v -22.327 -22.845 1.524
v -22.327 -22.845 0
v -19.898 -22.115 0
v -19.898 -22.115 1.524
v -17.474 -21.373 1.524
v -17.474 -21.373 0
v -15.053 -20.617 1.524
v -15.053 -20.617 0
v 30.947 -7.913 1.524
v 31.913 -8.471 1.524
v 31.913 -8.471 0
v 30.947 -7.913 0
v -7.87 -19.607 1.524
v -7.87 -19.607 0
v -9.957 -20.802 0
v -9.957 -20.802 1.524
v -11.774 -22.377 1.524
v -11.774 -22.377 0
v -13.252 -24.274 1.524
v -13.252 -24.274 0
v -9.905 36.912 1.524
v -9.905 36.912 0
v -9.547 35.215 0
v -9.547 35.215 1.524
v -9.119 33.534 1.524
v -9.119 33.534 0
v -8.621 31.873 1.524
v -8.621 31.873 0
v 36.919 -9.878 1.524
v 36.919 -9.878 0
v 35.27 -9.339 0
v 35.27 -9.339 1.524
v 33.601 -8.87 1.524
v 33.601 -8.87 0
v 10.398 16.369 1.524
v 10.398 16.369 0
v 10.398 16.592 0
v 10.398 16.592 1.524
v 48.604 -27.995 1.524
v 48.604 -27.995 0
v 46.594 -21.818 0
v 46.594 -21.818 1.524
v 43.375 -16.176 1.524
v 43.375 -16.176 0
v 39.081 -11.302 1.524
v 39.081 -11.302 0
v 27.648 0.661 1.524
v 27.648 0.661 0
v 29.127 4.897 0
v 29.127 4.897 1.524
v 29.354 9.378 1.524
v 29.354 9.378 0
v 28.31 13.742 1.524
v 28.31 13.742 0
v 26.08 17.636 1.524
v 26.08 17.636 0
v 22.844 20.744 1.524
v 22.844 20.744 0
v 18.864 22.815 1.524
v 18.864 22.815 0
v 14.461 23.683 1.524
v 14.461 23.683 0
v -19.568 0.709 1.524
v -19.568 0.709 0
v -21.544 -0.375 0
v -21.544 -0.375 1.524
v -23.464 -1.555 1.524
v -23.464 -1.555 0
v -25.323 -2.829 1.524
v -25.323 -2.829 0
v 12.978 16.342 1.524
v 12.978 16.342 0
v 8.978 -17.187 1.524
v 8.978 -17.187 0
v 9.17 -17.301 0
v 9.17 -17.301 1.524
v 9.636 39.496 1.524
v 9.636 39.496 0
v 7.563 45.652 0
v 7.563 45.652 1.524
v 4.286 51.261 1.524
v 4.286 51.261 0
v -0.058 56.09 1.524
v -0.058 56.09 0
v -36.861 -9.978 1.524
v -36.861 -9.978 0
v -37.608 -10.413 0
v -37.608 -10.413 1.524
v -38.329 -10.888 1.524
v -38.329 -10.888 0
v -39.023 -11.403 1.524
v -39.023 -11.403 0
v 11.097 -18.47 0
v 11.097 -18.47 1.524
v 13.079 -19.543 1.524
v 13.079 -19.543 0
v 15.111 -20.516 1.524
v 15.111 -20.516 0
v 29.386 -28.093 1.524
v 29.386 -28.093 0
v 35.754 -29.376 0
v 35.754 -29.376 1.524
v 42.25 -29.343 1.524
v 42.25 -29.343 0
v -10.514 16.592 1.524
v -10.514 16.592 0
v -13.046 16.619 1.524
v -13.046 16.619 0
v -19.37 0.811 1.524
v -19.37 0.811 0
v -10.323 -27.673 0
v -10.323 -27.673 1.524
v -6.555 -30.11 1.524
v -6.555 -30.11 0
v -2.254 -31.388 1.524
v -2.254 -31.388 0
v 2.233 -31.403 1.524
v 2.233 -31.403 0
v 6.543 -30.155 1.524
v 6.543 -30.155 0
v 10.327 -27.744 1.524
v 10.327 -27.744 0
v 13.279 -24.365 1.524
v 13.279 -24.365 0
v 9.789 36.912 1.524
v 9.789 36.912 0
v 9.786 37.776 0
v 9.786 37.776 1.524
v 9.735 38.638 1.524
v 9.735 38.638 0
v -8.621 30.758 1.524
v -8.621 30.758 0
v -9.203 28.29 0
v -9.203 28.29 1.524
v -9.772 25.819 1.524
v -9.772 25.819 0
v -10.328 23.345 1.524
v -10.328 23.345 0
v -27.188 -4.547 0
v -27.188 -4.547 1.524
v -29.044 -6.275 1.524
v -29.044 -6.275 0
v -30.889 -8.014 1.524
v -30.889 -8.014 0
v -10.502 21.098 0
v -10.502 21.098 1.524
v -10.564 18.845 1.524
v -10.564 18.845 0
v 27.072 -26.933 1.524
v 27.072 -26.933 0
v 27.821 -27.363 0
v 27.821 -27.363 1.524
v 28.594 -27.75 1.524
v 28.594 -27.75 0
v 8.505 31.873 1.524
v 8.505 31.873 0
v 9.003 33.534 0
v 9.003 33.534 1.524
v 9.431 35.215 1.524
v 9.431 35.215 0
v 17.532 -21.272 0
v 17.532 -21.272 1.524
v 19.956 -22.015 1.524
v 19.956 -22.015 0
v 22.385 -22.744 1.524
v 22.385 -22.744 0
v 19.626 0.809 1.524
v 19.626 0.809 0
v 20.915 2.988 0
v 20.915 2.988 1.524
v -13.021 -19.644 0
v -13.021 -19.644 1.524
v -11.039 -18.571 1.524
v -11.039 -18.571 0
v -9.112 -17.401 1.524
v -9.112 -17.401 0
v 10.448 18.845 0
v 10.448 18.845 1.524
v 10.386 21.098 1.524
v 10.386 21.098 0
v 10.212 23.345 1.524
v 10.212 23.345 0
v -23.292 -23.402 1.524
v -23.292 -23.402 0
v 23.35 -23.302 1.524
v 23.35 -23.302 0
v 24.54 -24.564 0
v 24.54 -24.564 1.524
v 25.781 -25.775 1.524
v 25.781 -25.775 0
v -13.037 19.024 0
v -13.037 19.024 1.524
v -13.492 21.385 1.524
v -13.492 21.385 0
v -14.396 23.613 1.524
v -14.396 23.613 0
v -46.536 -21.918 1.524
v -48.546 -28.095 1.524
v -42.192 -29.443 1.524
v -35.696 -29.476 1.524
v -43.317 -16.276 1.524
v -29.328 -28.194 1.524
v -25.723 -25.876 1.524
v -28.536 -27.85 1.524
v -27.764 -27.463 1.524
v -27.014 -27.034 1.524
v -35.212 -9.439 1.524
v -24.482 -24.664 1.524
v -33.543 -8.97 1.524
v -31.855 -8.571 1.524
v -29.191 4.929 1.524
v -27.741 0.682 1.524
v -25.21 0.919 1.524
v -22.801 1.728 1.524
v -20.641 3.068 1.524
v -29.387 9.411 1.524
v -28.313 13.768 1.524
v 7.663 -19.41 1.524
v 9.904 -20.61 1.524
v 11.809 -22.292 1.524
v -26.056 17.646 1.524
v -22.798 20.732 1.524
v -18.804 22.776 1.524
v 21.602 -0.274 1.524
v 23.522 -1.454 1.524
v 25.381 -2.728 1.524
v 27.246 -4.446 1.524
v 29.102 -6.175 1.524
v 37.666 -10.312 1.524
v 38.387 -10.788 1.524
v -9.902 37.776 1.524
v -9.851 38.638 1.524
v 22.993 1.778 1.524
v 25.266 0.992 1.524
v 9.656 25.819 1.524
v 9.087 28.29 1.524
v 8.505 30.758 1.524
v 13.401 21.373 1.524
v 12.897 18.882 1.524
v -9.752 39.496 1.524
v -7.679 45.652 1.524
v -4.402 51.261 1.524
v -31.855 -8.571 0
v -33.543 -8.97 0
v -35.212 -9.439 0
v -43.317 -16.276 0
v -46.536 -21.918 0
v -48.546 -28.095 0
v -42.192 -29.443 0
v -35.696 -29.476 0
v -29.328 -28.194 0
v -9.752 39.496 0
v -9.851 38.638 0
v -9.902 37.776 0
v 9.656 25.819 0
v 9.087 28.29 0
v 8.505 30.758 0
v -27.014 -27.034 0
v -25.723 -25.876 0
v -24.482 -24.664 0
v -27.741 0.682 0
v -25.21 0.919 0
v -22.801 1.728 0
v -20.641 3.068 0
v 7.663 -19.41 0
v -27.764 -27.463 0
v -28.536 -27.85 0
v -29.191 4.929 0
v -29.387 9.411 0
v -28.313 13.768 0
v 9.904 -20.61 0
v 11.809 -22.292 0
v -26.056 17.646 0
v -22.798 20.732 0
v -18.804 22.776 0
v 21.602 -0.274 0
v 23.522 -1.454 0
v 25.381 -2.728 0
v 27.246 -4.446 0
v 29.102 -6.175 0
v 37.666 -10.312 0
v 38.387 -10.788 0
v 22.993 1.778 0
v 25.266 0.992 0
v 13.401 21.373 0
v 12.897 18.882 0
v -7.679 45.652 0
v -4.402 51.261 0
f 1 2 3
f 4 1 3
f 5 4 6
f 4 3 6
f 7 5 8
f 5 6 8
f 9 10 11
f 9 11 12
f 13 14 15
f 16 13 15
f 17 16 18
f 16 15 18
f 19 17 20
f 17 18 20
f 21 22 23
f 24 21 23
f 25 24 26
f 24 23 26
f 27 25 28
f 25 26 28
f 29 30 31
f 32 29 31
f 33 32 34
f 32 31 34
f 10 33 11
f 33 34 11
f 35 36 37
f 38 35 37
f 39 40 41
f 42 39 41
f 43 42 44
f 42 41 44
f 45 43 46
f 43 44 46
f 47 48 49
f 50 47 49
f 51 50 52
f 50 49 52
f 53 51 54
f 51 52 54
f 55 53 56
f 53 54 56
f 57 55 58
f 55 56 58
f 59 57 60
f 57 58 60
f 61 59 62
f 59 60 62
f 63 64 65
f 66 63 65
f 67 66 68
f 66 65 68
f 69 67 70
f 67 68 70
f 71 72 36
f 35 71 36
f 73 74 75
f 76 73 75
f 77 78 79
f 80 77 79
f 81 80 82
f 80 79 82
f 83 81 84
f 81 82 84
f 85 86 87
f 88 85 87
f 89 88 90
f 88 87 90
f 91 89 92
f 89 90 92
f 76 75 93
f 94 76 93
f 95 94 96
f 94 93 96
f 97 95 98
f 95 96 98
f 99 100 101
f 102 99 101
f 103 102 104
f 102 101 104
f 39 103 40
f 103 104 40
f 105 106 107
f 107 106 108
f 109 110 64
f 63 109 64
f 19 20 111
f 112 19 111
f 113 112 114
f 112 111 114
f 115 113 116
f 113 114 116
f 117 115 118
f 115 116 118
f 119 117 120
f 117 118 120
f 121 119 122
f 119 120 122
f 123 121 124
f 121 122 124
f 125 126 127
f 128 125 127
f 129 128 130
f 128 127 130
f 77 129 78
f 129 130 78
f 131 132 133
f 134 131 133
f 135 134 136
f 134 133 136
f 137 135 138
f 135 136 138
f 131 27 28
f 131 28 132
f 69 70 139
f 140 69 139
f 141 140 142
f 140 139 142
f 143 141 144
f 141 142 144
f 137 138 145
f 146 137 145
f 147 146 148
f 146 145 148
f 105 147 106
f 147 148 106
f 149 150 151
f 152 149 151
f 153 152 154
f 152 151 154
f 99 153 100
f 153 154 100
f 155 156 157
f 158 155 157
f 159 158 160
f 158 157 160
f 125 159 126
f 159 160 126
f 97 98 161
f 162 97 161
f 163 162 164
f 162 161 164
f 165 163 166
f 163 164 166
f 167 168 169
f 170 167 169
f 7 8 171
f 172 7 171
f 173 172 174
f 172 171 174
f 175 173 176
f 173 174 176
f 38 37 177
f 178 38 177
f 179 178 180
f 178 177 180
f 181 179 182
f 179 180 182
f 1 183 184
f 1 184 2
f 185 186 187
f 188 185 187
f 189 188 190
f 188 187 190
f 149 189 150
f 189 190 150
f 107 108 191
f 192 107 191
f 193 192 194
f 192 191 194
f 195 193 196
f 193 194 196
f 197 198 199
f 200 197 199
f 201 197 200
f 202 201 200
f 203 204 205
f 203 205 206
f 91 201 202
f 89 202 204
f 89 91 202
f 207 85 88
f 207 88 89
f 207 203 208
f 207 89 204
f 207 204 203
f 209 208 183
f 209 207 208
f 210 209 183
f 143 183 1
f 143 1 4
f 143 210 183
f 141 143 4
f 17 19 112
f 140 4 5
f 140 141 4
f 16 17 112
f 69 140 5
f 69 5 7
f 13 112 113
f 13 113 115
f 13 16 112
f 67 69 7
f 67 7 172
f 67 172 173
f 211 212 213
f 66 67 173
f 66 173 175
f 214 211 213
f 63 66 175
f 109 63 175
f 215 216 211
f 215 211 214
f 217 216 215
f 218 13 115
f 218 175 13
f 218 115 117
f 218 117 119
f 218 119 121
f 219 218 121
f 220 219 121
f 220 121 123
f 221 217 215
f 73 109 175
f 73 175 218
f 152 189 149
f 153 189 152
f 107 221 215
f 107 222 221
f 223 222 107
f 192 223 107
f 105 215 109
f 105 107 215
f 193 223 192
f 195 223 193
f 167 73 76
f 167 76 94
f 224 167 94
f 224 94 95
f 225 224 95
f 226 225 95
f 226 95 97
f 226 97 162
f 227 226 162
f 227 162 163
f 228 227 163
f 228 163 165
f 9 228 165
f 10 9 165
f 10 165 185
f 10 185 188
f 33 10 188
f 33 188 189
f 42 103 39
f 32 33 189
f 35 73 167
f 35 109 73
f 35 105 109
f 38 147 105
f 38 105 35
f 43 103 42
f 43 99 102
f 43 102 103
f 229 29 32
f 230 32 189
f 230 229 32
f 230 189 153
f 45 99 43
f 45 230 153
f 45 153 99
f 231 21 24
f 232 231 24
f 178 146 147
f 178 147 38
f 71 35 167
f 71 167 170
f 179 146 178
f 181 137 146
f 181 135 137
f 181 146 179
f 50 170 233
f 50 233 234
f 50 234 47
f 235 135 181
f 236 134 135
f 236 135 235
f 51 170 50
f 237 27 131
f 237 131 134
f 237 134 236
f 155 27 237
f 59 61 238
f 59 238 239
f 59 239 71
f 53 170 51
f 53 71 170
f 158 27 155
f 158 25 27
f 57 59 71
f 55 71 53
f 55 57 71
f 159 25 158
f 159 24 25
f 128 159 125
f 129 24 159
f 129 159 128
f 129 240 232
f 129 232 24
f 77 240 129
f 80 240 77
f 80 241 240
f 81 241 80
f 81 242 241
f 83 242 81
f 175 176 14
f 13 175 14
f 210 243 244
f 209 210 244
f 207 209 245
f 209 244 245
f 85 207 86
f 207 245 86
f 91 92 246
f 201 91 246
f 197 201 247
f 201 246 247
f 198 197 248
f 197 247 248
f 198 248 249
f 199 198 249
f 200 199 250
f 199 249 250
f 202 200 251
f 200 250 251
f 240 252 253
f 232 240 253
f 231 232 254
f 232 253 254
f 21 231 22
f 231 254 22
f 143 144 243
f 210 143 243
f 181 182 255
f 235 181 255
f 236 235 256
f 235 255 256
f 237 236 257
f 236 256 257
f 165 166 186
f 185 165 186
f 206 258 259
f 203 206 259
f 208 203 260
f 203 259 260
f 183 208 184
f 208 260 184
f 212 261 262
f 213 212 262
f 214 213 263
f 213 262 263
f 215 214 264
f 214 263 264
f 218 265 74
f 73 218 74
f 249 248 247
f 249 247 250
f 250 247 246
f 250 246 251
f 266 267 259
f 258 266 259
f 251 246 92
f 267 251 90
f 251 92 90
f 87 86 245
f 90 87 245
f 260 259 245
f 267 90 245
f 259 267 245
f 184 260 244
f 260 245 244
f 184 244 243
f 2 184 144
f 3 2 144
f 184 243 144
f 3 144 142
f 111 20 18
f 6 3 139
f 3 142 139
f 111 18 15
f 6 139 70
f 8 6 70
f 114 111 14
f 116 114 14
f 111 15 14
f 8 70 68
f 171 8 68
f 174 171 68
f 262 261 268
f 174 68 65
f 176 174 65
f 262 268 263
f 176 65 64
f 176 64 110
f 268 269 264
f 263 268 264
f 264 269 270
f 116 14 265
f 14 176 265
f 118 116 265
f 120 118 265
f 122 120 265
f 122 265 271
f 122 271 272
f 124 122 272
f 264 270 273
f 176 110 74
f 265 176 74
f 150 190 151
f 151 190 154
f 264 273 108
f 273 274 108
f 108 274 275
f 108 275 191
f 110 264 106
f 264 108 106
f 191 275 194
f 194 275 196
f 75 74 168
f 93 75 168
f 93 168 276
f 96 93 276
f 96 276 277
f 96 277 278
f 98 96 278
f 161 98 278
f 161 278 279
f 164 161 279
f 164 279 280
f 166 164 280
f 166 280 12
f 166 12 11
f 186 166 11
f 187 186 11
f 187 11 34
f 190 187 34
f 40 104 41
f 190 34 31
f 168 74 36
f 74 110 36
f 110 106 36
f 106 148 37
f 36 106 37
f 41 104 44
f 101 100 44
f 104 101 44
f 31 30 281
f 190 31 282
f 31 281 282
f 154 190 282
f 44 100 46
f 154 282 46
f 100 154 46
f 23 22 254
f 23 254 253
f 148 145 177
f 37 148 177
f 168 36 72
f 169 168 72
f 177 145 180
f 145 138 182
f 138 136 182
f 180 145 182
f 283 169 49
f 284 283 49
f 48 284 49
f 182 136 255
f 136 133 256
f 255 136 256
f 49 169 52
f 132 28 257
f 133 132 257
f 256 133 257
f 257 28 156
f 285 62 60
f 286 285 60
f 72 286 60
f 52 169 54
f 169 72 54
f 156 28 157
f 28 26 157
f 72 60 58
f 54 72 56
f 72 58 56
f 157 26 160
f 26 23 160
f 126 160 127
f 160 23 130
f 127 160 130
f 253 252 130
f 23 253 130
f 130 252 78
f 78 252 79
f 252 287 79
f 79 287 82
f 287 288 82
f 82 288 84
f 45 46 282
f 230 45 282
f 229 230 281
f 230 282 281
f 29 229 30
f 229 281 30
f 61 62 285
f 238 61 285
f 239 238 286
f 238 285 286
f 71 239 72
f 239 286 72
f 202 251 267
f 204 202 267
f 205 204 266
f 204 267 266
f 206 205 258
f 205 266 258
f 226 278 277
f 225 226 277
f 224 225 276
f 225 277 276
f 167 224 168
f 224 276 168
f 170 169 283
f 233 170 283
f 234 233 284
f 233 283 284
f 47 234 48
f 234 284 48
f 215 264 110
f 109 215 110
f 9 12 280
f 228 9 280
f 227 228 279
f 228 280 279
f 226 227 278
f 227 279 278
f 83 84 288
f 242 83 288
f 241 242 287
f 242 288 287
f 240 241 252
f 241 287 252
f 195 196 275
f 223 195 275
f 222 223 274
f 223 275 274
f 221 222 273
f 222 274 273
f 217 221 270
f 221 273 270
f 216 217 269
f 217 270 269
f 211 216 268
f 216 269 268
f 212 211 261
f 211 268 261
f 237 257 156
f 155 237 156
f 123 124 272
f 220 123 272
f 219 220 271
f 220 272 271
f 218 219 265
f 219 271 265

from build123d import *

# Parameters (mm, degrees)
F1_DEPTH = 1.524


with BuildPart() as f1:
    # F0 (on Top) → F1 (new body)
    with BuildSketch(Plane.XY):
        with BuildLine():
            ThreePointArc((-10.328003, 23.34511), (-10.546485, 19.972041), (-10.513837, 16.592061))
            Line((-10.513837, 16.592061), (10.397906, 16.369229))
            Line((10.397906, 16.369229), (10.397906, 16.592061))
            ThreePointArc((10.397906, 16.592061), (10.430555, 19.972041), (10.212073, 23.34511))
            ThreePointArc((10.212073, 23.34511), (9.373504, 27.05499), (8.504586, 30.75788))
            Line((8.504586, 30.75788), (8.504586, 31.872794))
            ThreePointArc((8.504586, 31.872794), (9.226054, 34.37206), (9.788919, 36.91175))
            ThreePointArc((9.788919, 36.91175), (9.766765, 38.207065), (9.636335, 39.495986))
            ThreePointArc((9.636335, 39.495986), (6.067855, 48.539888), (-0.057965, 56.089759))
            ThreePointArc((-0.057965, 56.089759), (-6.183786, 48.539888), (-9.752265, 39.495986))
            ThreePointArc((-9.752265, 39.495986), (-9.882696, 38.207065), (-9.904849, 36.91175))
            ThreePointArc((-9.904849, 36.91175), (-9.341984, 34.37206), (-8.620516, 31.872794))
            Line((-8.620516, 31.872794), (-8.620516, 30.75788))
            ThreePointArc((-8.620516, 30.75788), (-9.489434, 27.05499), (-10.328003, 23.34511))
        make_face()
        with BuildLine():
            ThreePointArc((-14.396, 23.613142), (-27.322804, 15.78758), (-27.740605, 0.682378))
            ThreePointArc((-27.740605, 0.682378), (-23.982132, 1.254002), (-20.641251, 3.06822))
            Line((-20.641251, 3.06822), (-19.369999, 0.811142))
            Line((-19.369999, 0.811142), (-9.112228, -17.40128))
            Line((-9.112228, -17.40128), (-7.869689, -19.607378))
            ThreePointArc((-7.869689, -19.607378), (-10.90344, -21.545267), (-13.251581, -24.273872))
            ThreePointArc((-13.251581, -24.273872), (-0.011043, -31.556032), (13.279346, -24.365258))
            ThreePointArc((13.279346, -24.365258), (10.905069, -21.396137), (7.663469, -19.409958))
            Line((7.663469, -19.409958), (8.978424, -17.187422))
            Line((8.978424, -17.187422), (19.626065, 0.809219))
            Line((19.626065, 0.809219), (20.915332, 2.988339))
            ThreePointArc((20.915332, 2.988339), (24.110468, 1.329978), (27.647581, 0.660731))
            ThreePointArc((27.647581, 0.660731), (27.333847, 15.768452), (14.461259, 23.68288))
            ThreePointArc((14.461259, 23.68288), (13.077063, 20.142135), (12.977783, 16.341738))
            Line((12.977783, 16.341738), (10.397906, 16.369229))
            Line((10.397906, 16.369229), (-10.513837, 16.592061))
            Line((-10.513837, 16.592061), (-13.045643, 16.61904))
            ThreePointArc((-13.045643, 16.61904), (-13.207029, 20.215289), (-14.396, 23.613142))
        make_face()
        with BuildLine():
            Line((-9.112228, -17.40128), (-19.369999, 0.811142))
            Line((-19.369999, 0.811142), (-19.5681, 0.708821))
            ThreePointArc((-19.5681, 0.708821), (-22.511572, -0.952895), (-25.323495, -2.828641))
            ThreePointArc((-25.323495, -2.828641), (-28.117061, -5.409803), (-30.889398, -8.013752))
            Line((-30.889398, -8.013752), (-31.854942, -8.571209))
            ThreePointArc((-31.854942, -8.571209), (-34.380104, -9.196033), (-36.860973, -9.978423))
            ThreePointArc((-36.860973, -9.978423), (-37.971671, -10.645265), (-39.022695, -11.402682))
            ThreePointArc((-39.022695, -11.402682), (-45.070704, -19.015027), (-48.546173, -28.095079))
            ThreePointArc((-48.546173, -28.095079), (-38.944884, -29.62526), (-29.328395, -28.193702))
            ThreePointArc((-29.328395, -28.193702), (-28.146941, -27.662198), (-27.014089, -27.033726))
            ThreePointArc((-27.014089, -27.033726), (-25.096085, -25.276425), (-23.292391, -23.401983))
            Line((-23.292391, -23.401983), (-22.326847, -22.844526))
            ThreePointArc((-22.326847, -22.844526), (-18.685592, -21.745586), (-15.053457, -20.616868))
            ThreePointArc((-15.053457, -20.616868), (-12.023052, -19.119545), (-9.112228, -17.40128))
        make_face()
        with BuildLine():
            Line((19.626065, 0.809219), (8.978424, -17.187422))
            Line((8.978424, -17.187422), (9.170193, -17.300882))
            ThreePointArc((9.170193, -17.300882), (12.081018, -19.019146), (15.111422, -20.51647))
            ThreePointArc((15.111422, -20.51647), (18.743557, -21.645188), (22.384812, -22.744127))
            Line((22.384812, -22.744127), (23.350356, -23.301585))
            ThreePointArc((23.350356, -23.301585), (25.15405, -25.176027), (27.072054, -26.933327))
            ThreePointArc((27.072054, -26.933327), (28.204906, -27.561799), (29.38636, -28.093304))
            ThreePointArc((29.38636, -28.093304), (39.002849, -29.524861), (48.604139, -27.99468))
            ThreePointArc((48.604139, -27.99468), (45.128669, -18.914629), (39.08066, -11.302284))
            ThreePointArc((39.08066, -11.302284), (38.029636, -10.544867), (36.918938, -9.878024))
            ThreePointArc((36.918938, -9.878024), (34.438069, -9.095634), (31.912908, -8.470811))
            Line((31.912908, -8.470811), (30.947364, -7.913354))
            ThreePointArc((30.947364, -7.913354), (28.175026, -5.309404), (25.38146, -2.728242))
            ThreePointArc((25.38146, -2.728242), (22.569538, -0.852496), (19.626065, 0.809219))
        make_face()
    extrude(amount=F1_DEPTH)


solid = f1.part
